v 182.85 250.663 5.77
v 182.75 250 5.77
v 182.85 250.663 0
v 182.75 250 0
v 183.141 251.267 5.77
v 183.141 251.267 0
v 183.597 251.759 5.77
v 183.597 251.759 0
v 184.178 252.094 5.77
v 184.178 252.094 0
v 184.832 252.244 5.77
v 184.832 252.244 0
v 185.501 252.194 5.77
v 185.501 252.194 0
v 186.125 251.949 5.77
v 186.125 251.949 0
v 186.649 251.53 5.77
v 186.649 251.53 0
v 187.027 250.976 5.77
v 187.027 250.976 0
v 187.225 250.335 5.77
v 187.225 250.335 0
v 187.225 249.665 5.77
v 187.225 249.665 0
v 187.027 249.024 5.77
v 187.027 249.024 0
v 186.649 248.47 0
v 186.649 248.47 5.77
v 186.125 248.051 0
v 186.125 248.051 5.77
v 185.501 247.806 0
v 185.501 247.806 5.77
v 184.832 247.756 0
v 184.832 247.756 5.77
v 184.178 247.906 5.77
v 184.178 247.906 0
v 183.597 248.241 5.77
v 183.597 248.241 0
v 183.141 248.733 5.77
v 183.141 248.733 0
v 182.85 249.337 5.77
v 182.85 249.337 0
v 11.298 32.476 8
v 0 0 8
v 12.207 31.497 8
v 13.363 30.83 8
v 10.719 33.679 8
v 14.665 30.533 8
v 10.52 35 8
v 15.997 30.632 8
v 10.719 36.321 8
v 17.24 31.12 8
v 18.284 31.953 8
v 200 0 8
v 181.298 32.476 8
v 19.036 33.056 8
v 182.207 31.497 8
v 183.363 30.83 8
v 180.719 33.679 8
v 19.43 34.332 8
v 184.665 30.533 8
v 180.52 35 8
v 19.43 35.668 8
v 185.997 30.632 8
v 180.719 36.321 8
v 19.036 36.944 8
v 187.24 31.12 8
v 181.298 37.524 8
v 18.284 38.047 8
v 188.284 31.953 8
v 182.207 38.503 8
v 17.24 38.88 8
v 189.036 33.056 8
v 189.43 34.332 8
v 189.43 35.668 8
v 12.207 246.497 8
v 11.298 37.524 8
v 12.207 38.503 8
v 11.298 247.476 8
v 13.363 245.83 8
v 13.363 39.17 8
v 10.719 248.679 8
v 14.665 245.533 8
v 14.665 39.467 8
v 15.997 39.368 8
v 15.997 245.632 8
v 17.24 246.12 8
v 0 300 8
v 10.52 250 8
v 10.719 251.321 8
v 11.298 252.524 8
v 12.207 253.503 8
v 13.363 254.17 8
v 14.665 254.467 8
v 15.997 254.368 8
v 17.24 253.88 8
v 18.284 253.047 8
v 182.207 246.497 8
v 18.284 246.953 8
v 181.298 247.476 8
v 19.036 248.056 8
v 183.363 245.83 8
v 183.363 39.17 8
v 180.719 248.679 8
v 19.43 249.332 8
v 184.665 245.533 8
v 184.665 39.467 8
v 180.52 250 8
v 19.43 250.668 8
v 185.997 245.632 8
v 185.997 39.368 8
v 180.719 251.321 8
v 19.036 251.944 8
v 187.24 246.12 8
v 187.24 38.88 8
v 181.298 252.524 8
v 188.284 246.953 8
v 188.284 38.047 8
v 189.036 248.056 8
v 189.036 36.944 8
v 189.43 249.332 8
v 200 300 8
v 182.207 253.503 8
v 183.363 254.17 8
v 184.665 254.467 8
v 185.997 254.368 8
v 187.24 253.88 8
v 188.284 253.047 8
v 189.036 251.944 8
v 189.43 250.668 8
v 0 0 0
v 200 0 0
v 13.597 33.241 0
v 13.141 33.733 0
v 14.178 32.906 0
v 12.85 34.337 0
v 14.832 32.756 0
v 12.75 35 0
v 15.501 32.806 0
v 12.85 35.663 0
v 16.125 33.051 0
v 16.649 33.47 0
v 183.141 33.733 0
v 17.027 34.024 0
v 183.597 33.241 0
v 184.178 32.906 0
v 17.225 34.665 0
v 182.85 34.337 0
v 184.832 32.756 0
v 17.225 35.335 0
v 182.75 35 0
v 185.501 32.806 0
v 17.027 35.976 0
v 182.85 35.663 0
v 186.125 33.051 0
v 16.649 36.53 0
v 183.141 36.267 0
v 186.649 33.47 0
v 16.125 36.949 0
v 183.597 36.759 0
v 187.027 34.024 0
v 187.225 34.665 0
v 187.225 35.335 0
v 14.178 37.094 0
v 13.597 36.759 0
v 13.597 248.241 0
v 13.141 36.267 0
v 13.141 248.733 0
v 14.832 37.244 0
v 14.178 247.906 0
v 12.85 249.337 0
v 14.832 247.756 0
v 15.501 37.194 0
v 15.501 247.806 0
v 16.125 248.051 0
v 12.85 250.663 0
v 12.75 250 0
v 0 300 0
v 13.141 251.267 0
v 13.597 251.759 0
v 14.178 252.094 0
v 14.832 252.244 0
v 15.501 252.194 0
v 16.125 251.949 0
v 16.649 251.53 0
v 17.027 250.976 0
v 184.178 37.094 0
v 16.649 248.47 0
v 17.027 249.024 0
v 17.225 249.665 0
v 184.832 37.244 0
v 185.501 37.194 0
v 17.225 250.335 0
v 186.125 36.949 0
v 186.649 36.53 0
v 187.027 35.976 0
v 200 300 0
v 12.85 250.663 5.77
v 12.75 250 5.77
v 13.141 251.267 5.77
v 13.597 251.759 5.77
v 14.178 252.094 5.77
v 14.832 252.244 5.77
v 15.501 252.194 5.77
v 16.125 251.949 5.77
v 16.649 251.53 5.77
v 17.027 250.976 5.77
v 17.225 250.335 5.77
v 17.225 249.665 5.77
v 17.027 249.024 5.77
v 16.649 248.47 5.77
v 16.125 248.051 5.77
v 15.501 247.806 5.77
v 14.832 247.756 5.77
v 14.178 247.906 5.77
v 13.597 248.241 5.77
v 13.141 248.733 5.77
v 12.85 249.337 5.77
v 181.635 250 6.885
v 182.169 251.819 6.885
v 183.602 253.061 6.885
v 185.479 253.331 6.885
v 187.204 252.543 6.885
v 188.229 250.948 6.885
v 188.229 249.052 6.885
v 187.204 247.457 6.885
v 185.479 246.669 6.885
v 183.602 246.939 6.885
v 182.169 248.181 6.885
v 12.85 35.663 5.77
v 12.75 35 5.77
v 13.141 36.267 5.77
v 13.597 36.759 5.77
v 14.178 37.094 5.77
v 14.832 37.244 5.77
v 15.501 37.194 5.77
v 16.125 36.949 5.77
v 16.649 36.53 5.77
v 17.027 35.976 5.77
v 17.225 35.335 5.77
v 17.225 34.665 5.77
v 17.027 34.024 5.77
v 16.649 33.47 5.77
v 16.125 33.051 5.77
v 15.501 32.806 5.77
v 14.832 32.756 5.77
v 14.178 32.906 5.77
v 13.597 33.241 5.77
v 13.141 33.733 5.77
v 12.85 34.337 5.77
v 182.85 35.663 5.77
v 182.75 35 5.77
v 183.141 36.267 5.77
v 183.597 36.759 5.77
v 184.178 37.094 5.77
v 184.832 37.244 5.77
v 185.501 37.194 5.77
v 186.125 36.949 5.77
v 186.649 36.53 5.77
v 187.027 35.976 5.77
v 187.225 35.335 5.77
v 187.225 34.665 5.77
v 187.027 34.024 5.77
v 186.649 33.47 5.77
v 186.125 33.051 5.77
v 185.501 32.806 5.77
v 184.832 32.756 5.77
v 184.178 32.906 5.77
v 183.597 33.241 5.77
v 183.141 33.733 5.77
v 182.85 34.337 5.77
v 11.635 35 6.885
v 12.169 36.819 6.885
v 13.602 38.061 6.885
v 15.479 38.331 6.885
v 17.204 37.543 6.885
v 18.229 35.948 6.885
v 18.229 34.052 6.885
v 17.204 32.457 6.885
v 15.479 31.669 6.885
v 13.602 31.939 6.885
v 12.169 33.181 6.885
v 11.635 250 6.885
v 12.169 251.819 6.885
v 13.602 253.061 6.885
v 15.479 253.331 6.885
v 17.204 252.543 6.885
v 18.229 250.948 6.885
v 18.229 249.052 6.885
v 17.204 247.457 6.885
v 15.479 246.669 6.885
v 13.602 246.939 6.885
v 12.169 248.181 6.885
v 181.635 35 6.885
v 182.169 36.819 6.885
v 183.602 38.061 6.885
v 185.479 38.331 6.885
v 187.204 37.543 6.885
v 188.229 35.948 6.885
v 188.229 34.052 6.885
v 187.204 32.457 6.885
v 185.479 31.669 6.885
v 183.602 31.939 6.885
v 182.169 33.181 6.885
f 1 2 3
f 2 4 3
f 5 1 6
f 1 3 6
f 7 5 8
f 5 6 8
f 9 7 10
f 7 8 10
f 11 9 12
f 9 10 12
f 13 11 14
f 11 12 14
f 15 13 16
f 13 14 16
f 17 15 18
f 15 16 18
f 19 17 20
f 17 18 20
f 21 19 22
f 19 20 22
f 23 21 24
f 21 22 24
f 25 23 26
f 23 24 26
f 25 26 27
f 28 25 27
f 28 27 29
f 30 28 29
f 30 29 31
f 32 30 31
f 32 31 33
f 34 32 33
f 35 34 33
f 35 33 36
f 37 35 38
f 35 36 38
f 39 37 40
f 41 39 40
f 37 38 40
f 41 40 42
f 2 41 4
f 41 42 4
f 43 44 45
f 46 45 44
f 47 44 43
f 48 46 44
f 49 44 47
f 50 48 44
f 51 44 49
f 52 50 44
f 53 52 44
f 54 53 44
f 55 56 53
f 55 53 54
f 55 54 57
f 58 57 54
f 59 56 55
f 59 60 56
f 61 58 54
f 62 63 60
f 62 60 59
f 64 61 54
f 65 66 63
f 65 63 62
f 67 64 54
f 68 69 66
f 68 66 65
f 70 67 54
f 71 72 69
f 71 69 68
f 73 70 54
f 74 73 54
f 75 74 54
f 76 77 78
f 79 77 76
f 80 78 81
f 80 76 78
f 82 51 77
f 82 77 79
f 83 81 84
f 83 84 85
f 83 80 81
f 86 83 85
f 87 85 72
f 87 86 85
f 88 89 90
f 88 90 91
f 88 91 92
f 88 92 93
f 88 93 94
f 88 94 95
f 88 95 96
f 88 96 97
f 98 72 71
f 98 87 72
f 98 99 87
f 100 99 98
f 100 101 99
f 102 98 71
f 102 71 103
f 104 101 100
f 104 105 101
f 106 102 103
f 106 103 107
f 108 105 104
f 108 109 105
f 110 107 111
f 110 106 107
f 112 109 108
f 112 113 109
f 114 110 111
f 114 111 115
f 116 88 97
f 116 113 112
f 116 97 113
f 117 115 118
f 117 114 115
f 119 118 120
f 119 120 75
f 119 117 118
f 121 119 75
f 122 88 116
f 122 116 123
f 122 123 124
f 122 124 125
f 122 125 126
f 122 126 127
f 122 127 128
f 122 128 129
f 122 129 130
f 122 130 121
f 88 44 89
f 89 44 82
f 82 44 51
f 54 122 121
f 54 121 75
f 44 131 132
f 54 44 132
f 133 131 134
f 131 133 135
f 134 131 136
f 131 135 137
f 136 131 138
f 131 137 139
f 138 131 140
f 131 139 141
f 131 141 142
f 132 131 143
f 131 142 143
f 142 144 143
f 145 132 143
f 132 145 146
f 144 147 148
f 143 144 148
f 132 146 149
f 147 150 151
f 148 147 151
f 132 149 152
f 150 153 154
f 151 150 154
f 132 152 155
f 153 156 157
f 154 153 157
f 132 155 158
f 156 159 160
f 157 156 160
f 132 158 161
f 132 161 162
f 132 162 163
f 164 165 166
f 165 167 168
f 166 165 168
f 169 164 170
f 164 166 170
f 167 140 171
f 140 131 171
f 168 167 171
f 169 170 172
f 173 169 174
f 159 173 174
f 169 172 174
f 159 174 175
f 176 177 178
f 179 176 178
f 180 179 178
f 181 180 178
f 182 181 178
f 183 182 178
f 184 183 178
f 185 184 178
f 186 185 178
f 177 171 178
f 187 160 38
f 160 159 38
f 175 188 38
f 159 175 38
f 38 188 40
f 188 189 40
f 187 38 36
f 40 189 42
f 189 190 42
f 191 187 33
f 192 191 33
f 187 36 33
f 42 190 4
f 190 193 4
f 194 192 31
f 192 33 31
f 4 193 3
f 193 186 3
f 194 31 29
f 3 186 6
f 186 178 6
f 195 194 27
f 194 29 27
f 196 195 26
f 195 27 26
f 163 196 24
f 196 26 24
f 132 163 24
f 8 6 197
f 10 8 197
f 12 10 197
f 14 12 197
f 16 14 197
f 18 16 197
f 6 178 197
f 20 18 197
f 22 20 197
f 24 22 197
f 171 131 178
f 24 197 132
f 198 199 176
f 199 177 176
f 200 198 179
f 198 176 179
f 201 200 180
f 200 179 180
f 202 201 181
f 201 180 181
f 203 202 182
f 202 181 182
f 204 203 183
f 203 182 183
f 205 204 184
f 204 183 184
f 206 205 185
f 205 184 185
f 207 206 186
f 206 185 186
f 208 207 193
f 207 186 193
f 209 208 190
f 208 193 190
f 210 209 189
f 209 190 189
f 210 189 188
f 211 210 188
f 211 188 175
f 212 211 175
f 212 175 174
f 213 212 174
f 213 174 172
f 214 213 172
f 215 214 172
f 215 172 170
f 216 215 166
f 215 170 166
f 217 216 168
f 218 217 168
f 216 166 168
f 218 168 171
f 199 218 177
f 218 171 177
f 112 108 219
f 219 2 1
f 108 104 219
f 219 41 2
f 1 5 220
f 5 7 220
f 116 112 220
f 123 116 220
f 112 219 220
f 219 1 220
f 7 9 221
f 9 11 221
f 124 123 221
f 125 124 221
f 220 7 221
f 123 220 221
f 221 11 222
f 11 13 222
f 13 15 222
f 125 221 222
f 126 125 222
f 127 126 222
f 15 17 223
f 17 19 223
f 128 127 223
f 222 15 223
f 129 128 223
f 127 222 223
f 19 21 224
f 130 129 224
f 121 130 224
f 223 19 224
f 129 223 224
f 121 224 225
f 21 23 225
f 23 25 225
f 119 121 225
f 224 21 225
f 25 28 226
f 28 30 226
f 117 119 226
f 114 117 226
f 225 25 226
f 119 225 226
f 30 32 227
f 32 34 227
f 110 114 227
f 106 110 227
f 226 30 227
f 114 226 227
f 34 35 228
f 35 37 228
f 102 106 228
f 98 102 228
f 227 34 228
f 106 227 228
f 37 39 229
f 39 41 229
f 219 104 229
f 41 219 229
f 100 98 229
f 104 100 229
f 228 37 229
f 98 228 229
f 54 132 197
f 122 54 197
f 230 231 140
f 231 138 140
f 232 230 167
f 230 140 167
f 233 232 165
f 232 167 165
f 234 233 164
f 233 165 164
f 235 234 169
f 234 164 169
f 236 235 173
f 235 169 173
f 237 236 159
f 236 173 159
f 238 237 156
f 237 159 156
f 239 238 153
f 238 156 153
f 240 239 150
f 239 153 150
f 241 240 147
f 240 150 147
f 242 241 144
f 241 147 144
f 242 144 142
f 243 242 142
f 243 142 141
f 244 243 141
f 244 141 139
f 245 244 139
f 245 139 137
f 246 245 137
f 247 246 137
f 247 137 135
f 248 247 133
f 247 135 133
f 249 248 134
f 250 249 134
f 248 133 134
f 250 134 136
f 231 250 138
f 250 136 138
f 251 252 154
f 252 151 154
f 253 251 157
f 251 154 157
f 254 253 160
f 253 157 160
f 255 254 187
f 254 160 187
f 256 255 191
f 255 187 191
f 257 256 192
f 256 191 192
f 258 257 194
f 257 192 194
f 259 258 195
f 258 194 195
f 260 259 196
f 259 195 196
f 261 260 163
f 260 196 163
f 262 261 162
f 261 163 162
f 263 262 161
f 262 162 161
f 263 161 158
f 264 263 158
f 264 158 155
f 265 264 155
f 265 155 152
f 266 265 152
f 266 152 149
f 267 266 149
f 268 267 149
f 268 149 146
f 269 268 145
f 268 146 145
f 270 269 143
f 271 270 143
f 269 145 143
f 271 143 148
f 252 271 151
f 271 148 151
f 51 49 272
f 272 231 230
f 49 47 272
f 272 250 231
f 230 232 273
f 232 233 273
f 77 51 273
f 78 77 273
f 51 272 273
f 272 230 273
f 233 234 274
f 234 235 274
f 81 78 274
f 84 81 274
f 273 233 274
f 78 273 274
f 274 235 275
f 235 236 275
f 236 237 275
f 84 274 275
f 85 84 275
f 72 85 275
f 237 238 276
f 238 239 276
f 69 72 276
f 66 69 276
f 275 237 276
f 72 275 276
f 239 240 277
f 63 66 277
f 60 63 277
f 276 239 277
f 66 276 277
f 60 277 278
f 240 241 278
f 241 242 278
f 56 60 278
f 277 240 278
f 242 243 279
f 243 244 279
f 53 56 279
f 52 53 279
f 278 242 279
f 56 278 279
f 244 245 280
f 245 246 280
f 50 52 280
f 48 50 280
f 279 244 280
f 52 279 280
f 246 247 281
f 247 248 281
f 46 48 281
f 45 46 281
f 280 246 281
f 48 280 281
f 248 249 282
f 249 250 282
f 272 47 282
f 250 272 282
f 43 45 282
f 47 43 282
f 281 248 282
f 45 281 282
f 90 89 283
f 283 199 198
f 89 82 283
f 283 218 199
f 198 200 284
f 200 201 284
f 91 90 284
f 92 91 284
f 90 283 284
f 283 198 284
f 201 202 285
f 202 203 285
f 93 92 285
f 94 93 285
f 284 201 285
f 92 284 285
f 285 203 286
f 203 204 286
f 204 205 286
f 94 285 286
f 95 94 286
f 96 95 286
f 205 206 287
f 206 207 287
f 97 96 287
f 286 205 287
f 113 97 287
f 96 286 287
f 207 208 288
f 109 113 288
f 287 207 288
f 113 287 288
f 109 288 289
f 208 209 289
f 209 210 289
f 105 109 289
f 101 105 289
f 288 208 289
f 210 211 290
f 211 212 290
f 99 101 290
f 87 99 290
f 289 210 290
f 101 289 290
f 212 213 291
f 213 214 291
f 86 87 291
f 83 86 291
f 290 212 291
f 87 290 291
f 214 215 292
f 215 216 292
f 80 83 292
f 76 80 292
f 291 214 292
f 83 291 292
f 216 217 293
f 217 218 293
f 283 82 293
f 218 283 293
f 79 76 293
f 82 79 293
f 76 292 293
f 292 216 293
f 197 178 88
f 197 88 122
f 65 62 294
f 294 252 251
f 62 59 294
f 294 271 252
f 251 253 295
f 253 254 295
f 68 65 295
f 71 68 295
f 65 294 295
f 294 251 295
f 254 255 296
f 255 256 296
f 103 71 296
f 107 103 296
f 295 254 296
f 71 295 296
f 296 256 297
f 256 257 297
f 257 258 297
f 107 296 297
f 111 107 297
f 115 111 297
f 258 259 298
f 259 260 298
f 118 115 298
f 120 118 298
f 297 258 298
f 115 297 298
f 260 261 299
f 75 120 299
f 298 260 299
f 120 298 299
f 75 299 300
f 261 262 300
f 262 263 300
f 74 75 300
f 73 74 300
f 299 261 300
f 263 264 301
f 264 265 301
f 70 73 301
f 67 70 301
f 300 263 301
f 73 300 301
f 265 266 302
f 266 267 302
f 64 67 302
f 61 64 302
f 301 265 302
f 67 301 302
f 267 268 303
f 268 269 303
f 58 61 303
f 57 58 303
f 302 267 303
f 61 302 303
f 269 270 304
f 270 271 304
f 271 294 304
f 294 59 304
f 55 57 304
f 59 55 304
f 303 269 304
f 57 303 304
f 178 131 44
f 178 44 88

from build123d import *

# Parameters (mm, degrees)
ESBO_O1_W                            = 200
ESBO_O1_H                            = 300
RESSALTO_EXTRUS_O1_DEPTH             = 8
ESCAREADO_PARA_SFHCS_M41_D           = 4.5
ESCAREADO_PARA_SFHCS_M41_CSINK_D     = 8.96
ESCAREADO_PARA_SFHCS_M41_CSINK_ANGLE = 90


with BuildPart() as part:
    # Esboço1 → Ressalto-extrusão1 (new body)
    with BuildSketch(Plane.XY):
        with Locations((100, 150)):
            Rectangle(ESBO_O1_W, ESBO_O1_H)
    extrude(amount=RESSALTO_EXTRUS_O1_DEPTH)

    # Escareado para SFHCS M41 (through all)
    with Locations(Plane(origin=(15, 250, 8), x_dir=(1, 0, 0), z_dir=(0, 0, 1))):
        with Locations((0, 0), (170, 0), (0, -215), (170, -215)):
            CounterSinkHole(ESCAREADO_PARA_SFHCS_M41_D / 2, ESCAREADO_PARA_SFHCS_M41_CSINK_D / 2, counter_sink_angle=ESCAREADO_PARA_SFHCS_M41_CSINK_ANGLE)


solid = part.part
